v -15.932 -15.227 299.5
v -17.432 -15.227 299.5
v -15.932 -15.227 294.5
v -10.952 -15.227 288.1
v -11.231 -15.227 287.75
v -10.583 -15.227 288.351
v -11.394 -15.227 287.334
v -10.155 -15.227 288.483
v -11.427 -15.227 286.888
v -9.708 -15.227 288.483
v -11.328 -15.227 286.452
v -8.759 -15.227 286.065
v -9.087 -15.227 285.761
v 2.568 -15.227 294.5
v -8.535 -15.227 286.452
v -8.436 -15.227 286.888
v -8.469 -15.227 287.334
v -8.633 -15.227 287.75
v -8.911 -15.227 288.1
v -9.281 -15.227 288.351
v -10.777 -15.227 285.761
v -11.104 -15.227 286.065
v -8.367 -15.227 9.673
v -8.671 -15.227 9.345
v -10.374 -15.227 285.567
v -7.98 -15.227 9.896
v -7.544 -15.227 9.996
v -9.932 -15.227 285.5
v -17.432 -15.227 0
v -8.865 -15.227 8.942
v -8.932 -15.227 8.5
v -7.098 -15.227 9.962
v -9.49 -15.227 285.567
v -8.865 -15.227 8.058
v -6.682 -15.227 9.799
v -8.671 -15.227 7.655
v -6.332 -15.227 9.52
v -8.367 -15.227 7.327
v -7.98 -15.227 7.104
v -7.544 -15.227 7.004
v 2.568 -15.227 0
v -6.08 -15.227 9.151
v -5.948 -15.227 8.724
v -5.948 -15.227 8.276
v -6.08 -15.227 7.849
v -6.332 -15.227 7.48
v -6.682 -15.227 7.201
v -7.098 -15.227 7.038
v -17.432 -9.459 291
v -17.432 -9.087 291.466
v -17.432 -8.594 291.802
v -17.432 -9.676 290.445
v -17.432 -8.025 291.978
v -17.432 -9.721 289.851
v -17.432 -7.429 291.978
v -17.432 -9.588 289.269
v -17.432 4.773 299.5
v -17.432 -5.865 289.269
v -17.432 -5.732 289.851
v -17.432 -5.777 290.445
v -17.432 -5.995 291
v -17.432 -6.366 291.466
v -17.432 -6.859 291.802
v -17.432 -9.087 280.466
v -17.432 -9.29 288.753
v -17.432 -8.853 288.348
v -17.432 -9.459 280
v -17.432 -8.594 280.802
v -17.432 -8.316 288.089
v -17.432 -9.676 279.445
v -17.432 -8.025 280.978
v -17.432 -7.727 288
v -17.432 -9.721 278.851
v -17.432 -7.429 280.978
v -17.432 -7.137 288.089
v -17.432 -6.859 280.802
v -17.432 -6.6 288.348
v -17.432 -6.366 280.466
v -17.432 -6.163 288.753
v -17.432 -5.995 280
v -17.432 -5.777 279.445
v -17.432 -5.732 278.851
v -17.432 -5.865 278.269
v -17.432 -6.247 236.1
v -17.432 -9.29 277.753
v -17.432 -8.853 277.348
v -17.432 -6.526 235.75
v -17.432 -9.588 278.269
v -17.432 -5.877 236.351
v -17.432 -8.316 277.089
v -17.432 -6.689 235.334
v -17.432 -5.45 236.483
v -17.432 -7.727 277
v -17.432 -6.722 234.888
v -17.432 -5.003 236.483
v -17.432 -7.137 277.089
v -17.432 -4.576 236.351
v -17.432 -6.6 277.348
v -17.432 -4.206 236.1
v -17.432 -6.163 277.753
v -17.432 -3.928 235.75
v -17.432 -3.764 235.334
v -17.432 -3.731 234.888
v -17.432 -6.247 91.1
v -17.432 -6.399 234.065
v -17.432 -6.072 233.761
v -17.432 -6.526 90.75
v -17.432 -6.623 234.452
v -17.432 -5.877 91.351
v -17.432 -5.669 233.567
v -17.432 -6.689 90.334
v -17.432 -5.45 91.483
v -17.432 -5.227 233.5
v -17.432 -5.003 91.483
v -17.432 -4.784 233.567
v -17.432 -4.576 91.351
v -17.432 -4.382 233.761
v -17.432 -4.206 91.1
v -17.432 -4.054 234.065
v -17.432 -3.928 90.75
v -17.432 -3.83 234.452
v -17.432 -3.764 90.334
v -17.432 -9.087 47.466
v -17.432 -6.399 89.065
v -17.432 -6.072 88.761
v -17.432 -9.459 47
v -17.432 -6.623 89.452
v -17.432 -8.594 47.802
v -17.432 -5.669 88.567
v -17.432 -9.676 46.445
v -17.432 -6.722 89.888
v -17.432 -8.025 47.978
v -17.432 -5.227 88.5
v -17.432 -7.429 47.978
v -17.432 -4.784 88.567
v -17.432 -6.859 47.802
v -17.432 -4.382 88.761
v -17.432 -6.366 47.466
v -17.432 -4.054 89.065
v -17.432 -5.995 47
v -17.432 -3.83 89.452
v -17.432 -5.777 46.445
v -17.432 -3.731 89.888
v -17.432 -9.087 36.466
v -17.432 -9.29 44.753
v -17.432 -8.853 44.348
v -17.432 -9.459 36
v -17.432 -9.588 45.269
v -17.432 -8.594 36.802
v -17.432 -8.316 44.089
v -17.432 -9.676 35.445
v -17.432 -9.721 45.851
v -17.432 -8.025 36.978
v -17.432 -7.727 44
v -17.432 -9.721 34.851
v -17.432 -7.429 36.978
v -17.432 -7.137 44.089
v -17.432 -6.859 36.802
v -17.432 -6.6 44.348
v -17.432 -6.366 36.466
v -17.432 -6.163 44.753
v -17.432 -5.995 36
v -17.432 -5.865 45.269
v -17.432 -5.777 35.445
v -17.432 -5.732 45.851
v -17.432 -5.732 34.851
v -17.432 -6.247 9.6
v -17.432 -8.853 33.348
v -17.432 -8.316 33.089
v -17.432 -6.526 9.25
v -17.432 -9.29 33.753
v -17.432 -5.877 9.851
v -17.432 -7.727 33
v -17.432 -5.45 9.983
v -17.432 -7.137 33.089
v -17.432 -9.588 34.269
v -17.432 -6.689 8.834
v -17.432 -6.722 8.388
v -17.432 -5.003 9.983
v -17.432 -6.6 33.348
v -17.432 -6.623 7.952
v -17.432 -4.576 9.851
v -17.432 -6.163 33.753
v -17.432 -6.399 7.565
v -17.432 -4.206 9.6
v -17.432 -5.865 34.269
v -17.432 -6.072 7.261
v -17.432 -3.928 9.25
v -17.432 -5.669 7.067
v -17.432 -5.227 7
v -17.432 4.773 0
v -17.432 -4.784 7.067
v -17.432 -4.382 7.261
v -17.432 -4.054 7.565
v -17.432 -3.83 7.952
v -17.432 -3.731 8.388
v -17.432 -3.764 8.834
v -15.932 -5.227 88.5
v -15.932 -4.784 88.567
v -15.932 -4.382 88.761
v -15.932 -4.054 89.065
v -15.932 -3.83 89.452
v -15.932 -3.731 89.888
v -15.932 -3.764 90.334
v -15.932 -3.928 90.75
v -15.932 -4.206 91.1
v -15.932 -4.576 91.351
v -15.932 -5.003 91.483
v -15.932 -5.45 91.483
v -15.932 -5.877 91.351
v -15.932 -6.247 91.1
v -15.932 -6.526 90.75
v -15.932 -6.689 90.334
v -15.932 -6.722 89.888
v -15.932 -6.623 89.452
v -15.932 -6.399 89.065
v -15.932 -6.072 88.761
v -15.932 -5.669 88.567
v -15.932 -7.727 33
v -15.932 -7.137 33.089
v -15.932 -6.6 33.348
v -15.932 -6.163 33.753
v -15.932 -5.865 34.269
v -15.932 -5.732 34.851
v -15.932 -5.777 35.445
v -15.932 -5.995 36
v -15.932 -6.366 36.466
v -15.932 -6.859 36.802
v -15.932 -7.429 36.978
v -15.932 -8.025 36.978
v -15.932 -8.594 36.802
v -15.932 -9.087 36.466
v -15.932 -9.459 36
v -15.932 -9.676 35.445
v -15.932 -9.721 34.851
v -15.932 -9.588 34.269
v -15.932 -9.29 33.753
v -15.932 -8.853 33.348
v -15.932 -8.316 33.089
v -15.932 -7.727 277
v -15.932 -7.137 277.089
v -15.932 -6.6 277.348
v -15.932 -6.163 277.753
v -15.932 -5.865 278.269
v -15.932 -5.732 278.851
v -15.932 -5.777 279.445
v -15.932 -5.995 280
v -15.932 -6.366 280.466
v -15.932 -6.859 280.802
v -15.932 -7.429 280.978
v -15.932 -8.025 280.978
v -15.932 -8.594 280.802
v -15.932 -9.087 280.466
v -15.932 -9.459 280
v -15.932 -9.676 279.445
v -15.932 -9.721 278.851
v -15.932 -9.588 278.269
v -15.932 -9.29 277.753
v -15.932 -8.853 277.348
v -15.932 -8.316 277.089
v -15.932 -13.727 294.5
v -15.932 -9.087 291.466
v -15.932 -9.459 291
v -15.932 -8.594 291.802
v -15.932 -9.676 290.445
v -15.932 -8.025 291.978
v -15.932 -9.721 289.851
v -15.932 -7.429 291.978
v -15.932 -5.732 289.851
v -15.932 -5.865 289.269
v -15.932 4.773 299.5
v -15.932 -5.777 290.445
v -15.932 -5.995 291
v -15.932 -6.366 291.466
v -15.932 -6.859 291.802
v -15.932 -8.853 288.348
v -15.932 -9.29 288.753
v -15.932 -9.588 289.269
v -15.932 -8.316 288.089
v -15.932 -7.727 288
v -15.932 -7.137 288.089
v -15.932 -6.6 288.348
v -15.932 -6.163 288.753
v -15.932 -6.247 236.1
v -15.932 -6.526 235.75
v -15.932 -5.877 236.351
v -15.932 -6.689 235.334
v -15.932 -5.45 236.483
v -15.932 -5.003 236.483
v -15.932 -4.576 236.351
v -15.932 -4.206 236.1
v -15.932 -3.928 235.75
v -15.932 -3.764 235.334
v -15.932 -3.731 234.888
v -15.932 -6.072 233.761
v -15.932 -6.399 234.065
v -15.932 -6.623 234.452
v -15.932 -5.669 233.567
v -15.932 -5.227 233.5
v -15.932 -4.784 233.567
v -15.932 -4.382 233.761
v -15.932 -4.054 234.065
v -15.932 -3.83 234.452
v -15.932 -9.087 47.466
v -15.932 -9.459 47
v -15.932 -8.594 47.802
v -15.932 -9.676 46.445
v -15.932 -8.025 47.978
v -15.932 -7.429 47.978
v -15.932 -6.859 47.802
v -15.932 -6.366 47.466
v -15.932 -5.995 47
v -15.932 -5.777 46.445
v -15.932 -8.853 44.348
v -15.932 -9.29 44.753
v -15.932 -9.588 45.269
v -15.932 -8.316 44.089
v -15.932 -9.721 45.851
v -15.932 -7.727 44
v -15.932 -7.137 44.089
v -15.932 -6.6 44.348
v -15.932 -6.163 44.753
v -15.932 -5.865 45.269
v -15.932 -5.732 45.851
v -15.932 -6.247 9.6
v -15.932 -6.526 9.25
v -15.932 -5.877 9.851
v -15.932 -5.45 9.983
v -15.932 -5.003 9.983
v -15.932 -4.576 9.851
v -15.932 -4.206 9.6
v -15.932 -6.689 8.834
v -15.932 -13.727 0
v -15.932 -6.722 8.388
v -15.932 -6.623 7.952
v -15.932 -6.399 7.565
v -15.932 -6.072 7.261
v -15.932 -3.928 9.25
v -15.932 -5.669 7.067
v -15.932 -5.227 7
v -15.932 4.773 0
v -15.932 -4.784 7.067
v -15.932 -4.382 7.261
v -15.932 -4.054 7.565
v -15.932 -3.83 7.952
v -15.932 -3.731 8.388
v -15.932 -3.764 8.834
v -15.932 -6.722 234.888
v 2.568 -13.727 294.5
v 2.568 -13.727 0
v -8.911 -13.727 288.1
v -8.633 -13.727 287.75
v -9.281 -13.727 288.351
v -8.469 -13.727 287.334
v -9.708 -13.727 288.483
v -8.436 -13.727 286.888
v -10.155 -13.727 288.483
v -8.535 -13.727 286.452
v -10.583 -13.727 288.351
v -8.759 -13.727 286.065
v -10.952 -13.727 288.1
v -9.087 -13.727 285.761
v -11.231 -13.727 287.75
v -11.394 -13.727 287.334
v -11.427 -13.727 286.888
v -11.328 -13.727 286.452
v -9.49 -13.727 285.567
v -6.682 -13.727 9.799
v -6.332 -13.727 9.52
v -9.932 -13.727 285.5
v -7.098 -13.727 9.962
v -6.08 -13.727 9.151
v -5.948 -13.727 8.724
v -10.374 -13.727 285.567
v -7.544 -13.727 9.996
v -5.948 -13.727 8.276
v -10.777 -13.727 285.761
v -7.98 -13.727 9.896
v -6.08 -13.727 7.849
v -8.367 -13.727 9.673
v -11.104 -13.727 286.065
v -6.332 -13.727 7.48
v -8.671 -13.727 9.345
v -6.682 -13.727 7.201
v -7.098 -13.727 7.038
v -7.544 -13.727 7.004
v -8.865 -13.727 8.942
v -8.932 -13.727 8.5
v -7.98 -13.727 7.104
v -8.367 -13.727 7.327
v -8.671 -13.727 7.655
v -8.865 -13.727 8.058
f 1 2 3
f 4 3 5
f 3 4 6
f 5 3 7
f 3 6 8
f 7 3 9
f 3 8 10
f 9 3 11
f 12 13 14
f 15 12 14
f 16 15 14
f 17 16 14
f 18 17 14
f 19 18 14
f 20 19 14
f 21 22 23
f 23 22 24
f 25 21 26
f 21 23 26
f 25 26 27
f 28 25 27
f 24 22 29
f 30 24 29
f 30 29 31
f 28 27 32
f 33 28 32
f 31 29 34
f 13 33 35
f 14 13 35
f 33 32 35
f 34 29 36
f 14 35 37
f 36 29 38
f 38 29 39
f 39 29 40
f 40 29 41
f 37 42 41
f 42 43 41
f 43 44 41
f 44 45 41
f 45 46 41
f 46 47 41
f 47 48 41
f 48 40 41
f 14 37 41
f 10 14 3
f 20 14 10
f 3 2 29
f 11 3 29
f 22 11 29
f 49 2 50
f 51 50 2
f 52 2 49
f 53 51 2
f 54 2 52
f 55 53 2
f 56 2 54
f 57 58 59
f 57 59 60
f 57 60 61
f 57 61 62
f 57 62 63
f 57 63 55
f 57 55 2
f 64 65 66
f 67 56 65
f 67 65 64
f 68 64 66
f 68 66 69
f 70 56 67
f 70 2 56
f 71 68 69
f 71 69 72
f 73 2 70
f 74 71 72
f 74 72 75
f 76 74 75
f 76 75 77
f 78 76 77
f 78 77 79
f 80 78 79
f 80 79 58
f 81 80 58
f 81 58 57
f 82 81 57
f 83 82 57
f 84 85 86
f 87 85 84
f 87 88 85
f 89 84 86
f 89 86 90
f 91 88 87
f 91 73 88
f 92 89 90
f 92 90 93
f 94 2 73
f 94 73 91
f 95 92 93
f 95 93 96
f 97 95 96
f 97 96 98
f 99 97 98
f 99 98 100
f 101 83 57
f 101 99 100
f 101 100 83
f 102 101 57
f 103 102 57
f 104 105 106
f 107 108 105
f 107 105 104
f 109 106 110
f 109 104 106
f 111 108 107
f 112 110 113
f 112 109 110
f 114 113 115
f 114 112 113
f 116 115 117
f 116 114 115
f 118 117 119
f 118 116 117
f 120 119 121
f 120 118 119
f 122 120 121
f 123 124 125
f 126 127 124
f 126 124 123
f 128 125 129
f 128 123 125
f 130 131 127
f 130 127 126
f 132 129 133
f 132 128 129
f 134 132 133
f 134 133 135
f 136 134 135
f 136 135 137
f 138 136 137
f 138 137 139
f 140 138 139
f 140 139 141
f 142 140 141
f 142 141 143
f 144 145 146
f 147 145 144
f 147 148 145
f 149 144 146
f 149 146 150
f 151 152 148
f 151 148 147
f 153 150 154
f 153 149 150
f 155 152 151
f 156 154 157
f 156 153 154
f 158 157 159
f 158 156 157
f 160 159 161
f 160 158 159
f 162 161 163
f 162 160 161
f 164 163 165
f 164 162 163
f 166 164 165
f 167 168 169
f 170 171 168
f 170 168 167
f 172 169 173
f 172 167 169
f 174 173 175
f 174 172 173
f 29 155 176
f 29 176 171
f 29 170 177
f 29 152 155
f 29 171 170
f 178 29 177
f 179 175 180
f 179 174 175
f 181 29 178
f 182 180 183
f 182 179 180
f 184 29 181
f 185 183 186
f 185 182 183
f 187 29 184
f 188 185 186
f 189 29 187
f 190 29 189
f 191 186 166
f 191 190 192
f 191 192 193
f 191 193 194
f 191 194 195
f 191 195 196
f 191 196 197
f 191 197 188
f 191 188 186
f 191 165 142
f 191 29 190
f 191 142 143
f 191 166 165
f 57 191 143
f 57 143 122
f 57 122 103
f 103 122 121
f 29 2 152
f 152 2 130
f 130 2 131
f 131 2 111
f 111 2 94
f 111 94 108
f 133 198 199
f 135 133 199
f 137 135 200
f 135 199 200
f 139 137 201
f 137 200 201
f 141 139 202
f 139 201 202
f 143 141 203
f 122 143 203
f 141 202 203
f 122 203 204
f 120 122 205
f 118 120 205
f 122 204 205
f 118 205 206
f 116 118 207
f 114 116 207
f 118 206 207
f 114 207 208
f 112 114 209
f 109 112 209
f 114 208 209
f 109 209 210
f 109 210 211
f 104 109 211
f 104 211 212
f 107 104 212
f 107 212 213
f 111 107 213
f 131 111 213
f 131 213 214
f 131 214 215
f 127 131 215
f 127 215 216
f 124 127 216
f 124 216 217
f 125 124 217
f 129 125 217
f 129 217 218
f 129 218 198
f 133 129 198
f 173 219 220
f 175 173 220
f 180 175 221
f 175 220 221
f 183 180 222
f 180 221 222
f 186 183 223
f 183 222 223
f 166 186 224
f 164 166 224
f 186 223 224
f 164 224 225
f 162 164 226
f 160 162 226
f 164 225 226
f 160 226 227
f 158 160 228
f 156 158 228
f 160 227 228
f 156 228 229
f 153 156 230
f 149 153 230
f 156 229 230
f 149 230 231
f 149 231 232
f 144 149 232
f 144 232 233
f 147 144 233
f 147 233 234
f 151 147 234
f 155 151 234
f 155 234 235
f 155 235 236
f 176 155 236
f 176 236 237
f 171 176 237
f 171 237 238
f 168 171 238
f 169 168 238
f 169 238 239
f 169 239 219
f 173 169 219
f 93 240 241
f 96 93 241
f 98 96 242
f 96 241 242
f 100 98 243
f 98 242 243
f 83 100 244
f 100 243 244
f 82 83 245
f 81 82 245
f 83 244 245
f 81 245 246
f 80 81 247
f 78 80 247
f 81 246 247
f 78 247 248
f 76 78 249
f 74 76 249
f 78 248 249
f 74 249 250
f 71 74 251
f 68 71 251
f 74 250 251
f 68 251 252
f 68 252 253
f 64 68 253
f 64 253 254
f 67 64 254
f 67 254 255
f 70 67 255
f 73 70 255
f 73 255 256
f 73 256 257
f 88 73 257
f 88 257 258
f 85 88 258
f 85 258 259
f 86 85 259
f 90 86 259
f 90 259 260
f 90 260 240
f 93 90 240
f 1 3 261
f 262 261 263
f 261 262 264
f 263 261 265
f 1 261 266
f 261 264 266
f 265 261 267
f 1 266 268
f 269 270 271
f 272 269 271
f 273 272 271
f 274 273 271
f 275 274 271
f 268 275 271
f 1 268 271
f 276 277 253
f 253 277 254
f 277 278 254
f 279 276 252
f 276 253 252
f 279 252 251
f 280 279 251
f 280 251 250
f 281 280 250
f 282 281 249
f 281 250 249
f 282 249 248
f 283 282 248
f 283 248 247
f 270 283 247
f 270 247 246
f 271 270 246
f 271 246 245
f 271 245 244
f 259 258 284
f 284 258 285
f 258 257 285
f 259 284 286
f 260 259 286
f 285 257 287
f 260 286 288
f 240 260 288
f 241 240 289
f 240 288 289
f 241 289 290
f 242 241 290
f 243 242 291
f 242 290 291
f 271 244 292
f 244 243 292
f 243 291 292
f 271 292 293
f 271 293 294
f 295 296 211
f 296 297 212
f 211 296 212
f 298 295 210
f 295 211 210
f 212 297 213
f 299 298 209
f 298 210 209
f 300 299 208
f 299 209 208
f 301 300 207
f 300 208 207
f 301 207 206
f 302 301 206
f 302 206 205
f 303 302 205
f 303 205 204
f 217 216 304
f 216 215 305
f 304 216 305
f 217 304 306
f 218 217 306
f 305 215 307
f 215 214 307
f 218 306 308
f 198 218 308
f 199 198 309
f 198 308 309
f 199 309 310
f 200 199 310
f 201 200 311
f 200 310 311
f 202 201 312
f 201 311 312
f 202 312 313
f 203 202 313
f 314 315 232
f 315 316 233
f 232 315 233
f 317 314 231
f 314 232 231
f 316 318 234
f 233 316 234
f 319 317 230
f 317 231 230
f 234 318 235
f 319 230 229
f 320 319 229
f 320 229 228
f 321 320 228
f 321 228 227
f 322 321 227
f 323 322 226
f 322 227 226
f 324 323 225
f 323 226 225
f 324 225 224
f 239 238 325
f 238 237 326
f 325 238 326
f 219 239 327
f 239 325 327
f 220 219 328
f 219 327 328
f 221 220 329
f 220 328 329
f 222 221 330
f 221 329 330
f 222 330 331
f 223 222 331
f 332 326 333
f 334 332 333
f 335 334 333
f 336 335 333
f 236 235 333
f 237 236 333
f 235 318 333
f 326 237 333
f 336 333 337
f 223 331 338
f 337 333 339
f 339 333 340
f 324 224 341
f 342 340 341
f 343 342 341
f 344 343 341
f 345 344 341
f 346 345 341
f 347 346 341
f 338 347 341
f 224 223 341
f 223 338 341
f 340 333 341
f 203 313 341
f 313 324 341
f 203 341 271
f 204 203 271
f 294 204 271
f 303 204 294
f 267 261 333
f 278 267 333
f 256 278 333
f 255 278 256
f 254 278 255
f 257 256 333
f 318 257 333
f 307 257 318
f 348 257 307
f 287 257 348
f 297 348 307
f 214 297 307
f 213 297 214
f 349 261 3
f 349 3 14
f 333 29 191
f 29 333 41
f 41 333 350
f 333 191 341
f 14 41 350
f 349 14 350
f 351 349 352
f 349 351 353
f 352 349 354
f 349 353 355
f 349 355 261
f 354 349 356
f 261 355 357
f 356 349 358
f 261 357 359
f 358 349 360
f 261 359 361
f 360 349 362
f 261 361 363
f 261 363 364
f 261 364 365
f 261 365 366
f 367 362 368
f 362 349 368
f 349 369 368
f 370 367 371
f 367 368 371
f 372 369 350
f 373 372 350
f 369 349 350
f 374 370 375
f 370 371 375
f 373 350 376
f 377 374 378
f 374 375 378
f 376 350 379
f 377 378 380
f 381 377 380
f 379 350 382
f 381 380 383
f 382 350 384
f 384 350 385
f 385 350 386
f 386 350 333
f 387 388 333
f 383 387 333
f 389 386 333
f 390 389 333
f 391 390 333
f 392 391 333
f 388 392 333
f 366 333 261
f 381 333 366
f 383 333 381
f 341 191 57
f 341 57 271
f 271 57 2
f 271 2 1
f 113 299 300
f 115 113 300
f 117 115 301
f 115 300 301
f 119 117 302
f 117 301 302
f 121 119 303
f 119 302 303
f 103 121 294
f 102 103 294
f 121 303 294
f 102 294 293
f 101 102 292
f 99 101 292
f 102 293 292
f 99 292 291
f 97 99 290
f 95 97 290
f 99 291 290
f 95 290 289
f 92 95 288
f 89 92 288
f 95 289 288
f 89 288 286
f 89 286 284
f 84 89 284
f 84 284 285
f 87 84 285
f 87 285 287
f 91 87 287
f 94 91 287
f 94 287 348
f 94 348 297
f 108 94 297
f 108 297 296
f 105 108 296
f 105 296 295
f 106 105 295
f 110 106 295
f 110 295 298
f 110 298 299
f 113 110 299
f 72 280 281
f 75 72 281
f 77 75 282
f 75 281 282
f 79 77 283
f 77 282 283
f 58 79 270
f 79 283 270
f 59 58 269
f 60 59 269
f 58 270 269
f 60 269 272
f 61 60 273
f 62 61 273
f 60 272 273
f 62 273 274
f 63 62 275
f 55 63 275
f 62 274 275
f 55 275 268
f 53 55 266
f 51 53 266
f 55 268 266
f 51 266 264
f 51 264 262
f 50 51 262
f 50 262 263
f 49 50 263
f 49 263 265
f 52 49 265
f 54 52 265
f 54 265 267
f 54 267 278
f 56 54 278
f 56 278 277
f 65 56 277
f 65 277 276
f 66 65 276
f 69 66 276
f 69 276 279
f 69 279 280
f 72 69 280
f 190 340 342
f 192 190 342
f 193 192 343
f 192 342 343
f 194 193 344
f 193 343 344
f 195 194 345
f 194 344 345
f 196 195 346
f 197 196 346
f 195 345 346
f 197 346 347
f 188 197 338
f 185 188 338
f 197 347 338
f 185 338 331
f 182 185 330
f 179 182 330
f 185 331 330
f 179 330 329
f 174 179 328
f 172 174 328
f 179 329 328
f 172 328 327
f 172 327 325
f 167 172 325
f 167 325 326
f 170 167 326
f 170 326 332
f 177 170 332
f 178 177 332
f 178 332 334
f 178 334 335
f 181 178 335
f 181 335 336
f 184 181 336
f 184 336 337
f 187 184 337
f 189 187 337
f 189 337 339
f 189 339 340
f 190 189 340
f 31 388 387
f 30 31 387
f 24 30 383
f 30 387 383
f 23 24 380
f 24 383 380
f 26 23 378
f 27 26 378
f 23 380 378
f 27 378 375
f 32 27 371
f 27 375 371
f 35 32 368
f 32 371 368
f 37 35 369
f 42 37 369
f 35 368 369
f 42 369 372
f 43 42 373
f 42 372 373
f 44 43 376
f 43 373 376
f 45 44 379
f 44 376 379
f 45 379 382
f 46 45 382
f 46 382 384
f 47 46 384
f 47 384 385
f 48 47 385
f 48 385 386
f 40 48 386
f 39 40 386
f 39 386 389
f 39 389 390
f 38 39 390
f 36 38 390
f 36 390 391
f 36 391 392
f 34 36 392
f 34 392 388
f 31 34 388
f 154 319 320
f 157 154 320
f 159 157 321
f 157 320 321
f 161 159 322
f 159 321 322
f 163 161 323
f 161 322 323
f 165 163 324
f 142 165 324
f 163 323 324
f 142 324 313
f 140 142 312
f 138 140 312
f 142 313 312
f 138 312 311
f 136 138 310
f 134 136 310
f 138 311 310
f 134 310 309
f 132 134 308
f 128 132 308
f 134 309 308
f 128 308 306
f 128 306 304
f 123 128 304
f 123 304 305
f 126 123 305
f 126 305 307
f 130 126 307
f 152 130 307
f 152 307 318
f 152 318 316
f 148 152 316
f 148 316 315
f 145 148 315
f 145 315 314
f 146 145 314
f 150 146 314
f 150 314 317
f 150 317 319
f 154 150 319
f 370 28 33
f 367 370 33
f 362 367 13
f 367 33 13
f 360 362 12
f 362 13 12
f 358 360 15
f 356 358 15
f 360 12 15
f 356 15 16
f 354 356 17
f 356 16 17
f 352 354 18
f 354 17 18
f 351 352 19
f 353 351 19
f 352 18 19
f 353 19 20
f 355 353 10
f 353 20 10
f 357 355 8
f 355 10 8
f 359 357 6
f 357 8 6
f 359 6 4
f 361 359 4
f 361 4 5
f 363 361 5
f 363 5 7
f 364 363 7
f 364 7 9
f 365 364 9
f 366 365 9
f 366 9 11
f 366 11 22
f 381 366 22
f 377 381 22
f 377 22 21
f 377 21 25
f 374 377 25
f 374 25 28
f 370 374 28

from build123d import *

# Parameters (mm, degrees)
EXTRUSION1_DEPTH = 294.5
ESQUISSE2_R      = 1.5
EXTRUSION2_DEPTH = 300
ESQUISSE3_R      = 1.5
ESQUISSE3_R_2    = 2
EXTRUSION3_DEPTH = 300
ESQUISSE4_W      = 1.5
ESQUISSE4_H      = 20
EXTRUSION4_DEPTH = 5
ESQUISSE5_R      = 1.5
EXTRUSION5_DEPTH = 5


with BuildPart() as part:
    # Esquisse1 → Extrusion1 (new body)
    with BuildSketch(Plane.XY):
        Polygon((-17.43168638, 4.773368421), (-17.43168638, -15.226631579), (2.56831362, -15.226631579), (2.56831362, -13.726631579), (-15.93168638, -13.726631579), (-15.93168638, 4.773368421), align=None)
    extrude(amount=EXTRUSION1_DEPTH)

    # Esquisse2 → Extrusion2 (cut)
    with BuildSketch(Plane(origin=(0, -13.726631579, 0), x_dir=(-1, 0, 0), z_dir=(0, 1, 0))):
        with Locations((7.43168638, 8.5)):
            Circle(ESQUISSE2_R)
    extrude(amount=-EXTRUSION2_DEPTH, mode=Mode.SUBTRACT)

    # Esquisse3 → Extrusion3 (cut)
    with BuildSketch(Plane(origin=(-15.93168638, 0, 0), x_dir=(0, 0, -1), z_dir=(1, 0, 0))):
        with Locations((-8.5, -5.226631579)):
            Circle(ESQUISSE3_R)
        with Locations((-35, -7.726631579)):
            Circle(ESQUISSE3_R_2)
        with Locations((-46, -7.726631579)):
            Circle(ESQUISSE3_R_2)
        with Locations((-290, -7.726631579)):
            Circle(ESQUISSE3_R_2)
        with Locations((-279, -7.726631579)):
            Circle(ESQUISSE3_R_2)
        with Locations((-235, -5.226631579)):
            Circle(ESQUISSE3_R)
        with Locations((-90, -5.226631579)):
            Circle(ESQUISSE3_R)
    extrude(amount=-EXTRUSION3_DEPTH, mode=Mode.SUBTRACT)

    # Esquisse4 → Extrusion4 (add)
    with BuildSketch(Plane.XY.offset(294.5)):
        with Locations((-16.68168638, -5.226631579)):
            Rectangle(ESQUISSE4_W, ESQUISSE4_H)
    extrude(amount=EXTRUSION4_DEPTH)

    # Esquisse5 → Extrusion5 (cut)
    with BuildSketch(Plane.XZ.offset(15.226631579)):
        with Locations(Location((-9.93168638, 287, 0), (0, 0, 270))):
            Circle(ESQUISSE5_R)
    extrude(amount=-EXTRUSION5_DEPTH, mode=Mode.SUBTRACT)


solid = part.part
